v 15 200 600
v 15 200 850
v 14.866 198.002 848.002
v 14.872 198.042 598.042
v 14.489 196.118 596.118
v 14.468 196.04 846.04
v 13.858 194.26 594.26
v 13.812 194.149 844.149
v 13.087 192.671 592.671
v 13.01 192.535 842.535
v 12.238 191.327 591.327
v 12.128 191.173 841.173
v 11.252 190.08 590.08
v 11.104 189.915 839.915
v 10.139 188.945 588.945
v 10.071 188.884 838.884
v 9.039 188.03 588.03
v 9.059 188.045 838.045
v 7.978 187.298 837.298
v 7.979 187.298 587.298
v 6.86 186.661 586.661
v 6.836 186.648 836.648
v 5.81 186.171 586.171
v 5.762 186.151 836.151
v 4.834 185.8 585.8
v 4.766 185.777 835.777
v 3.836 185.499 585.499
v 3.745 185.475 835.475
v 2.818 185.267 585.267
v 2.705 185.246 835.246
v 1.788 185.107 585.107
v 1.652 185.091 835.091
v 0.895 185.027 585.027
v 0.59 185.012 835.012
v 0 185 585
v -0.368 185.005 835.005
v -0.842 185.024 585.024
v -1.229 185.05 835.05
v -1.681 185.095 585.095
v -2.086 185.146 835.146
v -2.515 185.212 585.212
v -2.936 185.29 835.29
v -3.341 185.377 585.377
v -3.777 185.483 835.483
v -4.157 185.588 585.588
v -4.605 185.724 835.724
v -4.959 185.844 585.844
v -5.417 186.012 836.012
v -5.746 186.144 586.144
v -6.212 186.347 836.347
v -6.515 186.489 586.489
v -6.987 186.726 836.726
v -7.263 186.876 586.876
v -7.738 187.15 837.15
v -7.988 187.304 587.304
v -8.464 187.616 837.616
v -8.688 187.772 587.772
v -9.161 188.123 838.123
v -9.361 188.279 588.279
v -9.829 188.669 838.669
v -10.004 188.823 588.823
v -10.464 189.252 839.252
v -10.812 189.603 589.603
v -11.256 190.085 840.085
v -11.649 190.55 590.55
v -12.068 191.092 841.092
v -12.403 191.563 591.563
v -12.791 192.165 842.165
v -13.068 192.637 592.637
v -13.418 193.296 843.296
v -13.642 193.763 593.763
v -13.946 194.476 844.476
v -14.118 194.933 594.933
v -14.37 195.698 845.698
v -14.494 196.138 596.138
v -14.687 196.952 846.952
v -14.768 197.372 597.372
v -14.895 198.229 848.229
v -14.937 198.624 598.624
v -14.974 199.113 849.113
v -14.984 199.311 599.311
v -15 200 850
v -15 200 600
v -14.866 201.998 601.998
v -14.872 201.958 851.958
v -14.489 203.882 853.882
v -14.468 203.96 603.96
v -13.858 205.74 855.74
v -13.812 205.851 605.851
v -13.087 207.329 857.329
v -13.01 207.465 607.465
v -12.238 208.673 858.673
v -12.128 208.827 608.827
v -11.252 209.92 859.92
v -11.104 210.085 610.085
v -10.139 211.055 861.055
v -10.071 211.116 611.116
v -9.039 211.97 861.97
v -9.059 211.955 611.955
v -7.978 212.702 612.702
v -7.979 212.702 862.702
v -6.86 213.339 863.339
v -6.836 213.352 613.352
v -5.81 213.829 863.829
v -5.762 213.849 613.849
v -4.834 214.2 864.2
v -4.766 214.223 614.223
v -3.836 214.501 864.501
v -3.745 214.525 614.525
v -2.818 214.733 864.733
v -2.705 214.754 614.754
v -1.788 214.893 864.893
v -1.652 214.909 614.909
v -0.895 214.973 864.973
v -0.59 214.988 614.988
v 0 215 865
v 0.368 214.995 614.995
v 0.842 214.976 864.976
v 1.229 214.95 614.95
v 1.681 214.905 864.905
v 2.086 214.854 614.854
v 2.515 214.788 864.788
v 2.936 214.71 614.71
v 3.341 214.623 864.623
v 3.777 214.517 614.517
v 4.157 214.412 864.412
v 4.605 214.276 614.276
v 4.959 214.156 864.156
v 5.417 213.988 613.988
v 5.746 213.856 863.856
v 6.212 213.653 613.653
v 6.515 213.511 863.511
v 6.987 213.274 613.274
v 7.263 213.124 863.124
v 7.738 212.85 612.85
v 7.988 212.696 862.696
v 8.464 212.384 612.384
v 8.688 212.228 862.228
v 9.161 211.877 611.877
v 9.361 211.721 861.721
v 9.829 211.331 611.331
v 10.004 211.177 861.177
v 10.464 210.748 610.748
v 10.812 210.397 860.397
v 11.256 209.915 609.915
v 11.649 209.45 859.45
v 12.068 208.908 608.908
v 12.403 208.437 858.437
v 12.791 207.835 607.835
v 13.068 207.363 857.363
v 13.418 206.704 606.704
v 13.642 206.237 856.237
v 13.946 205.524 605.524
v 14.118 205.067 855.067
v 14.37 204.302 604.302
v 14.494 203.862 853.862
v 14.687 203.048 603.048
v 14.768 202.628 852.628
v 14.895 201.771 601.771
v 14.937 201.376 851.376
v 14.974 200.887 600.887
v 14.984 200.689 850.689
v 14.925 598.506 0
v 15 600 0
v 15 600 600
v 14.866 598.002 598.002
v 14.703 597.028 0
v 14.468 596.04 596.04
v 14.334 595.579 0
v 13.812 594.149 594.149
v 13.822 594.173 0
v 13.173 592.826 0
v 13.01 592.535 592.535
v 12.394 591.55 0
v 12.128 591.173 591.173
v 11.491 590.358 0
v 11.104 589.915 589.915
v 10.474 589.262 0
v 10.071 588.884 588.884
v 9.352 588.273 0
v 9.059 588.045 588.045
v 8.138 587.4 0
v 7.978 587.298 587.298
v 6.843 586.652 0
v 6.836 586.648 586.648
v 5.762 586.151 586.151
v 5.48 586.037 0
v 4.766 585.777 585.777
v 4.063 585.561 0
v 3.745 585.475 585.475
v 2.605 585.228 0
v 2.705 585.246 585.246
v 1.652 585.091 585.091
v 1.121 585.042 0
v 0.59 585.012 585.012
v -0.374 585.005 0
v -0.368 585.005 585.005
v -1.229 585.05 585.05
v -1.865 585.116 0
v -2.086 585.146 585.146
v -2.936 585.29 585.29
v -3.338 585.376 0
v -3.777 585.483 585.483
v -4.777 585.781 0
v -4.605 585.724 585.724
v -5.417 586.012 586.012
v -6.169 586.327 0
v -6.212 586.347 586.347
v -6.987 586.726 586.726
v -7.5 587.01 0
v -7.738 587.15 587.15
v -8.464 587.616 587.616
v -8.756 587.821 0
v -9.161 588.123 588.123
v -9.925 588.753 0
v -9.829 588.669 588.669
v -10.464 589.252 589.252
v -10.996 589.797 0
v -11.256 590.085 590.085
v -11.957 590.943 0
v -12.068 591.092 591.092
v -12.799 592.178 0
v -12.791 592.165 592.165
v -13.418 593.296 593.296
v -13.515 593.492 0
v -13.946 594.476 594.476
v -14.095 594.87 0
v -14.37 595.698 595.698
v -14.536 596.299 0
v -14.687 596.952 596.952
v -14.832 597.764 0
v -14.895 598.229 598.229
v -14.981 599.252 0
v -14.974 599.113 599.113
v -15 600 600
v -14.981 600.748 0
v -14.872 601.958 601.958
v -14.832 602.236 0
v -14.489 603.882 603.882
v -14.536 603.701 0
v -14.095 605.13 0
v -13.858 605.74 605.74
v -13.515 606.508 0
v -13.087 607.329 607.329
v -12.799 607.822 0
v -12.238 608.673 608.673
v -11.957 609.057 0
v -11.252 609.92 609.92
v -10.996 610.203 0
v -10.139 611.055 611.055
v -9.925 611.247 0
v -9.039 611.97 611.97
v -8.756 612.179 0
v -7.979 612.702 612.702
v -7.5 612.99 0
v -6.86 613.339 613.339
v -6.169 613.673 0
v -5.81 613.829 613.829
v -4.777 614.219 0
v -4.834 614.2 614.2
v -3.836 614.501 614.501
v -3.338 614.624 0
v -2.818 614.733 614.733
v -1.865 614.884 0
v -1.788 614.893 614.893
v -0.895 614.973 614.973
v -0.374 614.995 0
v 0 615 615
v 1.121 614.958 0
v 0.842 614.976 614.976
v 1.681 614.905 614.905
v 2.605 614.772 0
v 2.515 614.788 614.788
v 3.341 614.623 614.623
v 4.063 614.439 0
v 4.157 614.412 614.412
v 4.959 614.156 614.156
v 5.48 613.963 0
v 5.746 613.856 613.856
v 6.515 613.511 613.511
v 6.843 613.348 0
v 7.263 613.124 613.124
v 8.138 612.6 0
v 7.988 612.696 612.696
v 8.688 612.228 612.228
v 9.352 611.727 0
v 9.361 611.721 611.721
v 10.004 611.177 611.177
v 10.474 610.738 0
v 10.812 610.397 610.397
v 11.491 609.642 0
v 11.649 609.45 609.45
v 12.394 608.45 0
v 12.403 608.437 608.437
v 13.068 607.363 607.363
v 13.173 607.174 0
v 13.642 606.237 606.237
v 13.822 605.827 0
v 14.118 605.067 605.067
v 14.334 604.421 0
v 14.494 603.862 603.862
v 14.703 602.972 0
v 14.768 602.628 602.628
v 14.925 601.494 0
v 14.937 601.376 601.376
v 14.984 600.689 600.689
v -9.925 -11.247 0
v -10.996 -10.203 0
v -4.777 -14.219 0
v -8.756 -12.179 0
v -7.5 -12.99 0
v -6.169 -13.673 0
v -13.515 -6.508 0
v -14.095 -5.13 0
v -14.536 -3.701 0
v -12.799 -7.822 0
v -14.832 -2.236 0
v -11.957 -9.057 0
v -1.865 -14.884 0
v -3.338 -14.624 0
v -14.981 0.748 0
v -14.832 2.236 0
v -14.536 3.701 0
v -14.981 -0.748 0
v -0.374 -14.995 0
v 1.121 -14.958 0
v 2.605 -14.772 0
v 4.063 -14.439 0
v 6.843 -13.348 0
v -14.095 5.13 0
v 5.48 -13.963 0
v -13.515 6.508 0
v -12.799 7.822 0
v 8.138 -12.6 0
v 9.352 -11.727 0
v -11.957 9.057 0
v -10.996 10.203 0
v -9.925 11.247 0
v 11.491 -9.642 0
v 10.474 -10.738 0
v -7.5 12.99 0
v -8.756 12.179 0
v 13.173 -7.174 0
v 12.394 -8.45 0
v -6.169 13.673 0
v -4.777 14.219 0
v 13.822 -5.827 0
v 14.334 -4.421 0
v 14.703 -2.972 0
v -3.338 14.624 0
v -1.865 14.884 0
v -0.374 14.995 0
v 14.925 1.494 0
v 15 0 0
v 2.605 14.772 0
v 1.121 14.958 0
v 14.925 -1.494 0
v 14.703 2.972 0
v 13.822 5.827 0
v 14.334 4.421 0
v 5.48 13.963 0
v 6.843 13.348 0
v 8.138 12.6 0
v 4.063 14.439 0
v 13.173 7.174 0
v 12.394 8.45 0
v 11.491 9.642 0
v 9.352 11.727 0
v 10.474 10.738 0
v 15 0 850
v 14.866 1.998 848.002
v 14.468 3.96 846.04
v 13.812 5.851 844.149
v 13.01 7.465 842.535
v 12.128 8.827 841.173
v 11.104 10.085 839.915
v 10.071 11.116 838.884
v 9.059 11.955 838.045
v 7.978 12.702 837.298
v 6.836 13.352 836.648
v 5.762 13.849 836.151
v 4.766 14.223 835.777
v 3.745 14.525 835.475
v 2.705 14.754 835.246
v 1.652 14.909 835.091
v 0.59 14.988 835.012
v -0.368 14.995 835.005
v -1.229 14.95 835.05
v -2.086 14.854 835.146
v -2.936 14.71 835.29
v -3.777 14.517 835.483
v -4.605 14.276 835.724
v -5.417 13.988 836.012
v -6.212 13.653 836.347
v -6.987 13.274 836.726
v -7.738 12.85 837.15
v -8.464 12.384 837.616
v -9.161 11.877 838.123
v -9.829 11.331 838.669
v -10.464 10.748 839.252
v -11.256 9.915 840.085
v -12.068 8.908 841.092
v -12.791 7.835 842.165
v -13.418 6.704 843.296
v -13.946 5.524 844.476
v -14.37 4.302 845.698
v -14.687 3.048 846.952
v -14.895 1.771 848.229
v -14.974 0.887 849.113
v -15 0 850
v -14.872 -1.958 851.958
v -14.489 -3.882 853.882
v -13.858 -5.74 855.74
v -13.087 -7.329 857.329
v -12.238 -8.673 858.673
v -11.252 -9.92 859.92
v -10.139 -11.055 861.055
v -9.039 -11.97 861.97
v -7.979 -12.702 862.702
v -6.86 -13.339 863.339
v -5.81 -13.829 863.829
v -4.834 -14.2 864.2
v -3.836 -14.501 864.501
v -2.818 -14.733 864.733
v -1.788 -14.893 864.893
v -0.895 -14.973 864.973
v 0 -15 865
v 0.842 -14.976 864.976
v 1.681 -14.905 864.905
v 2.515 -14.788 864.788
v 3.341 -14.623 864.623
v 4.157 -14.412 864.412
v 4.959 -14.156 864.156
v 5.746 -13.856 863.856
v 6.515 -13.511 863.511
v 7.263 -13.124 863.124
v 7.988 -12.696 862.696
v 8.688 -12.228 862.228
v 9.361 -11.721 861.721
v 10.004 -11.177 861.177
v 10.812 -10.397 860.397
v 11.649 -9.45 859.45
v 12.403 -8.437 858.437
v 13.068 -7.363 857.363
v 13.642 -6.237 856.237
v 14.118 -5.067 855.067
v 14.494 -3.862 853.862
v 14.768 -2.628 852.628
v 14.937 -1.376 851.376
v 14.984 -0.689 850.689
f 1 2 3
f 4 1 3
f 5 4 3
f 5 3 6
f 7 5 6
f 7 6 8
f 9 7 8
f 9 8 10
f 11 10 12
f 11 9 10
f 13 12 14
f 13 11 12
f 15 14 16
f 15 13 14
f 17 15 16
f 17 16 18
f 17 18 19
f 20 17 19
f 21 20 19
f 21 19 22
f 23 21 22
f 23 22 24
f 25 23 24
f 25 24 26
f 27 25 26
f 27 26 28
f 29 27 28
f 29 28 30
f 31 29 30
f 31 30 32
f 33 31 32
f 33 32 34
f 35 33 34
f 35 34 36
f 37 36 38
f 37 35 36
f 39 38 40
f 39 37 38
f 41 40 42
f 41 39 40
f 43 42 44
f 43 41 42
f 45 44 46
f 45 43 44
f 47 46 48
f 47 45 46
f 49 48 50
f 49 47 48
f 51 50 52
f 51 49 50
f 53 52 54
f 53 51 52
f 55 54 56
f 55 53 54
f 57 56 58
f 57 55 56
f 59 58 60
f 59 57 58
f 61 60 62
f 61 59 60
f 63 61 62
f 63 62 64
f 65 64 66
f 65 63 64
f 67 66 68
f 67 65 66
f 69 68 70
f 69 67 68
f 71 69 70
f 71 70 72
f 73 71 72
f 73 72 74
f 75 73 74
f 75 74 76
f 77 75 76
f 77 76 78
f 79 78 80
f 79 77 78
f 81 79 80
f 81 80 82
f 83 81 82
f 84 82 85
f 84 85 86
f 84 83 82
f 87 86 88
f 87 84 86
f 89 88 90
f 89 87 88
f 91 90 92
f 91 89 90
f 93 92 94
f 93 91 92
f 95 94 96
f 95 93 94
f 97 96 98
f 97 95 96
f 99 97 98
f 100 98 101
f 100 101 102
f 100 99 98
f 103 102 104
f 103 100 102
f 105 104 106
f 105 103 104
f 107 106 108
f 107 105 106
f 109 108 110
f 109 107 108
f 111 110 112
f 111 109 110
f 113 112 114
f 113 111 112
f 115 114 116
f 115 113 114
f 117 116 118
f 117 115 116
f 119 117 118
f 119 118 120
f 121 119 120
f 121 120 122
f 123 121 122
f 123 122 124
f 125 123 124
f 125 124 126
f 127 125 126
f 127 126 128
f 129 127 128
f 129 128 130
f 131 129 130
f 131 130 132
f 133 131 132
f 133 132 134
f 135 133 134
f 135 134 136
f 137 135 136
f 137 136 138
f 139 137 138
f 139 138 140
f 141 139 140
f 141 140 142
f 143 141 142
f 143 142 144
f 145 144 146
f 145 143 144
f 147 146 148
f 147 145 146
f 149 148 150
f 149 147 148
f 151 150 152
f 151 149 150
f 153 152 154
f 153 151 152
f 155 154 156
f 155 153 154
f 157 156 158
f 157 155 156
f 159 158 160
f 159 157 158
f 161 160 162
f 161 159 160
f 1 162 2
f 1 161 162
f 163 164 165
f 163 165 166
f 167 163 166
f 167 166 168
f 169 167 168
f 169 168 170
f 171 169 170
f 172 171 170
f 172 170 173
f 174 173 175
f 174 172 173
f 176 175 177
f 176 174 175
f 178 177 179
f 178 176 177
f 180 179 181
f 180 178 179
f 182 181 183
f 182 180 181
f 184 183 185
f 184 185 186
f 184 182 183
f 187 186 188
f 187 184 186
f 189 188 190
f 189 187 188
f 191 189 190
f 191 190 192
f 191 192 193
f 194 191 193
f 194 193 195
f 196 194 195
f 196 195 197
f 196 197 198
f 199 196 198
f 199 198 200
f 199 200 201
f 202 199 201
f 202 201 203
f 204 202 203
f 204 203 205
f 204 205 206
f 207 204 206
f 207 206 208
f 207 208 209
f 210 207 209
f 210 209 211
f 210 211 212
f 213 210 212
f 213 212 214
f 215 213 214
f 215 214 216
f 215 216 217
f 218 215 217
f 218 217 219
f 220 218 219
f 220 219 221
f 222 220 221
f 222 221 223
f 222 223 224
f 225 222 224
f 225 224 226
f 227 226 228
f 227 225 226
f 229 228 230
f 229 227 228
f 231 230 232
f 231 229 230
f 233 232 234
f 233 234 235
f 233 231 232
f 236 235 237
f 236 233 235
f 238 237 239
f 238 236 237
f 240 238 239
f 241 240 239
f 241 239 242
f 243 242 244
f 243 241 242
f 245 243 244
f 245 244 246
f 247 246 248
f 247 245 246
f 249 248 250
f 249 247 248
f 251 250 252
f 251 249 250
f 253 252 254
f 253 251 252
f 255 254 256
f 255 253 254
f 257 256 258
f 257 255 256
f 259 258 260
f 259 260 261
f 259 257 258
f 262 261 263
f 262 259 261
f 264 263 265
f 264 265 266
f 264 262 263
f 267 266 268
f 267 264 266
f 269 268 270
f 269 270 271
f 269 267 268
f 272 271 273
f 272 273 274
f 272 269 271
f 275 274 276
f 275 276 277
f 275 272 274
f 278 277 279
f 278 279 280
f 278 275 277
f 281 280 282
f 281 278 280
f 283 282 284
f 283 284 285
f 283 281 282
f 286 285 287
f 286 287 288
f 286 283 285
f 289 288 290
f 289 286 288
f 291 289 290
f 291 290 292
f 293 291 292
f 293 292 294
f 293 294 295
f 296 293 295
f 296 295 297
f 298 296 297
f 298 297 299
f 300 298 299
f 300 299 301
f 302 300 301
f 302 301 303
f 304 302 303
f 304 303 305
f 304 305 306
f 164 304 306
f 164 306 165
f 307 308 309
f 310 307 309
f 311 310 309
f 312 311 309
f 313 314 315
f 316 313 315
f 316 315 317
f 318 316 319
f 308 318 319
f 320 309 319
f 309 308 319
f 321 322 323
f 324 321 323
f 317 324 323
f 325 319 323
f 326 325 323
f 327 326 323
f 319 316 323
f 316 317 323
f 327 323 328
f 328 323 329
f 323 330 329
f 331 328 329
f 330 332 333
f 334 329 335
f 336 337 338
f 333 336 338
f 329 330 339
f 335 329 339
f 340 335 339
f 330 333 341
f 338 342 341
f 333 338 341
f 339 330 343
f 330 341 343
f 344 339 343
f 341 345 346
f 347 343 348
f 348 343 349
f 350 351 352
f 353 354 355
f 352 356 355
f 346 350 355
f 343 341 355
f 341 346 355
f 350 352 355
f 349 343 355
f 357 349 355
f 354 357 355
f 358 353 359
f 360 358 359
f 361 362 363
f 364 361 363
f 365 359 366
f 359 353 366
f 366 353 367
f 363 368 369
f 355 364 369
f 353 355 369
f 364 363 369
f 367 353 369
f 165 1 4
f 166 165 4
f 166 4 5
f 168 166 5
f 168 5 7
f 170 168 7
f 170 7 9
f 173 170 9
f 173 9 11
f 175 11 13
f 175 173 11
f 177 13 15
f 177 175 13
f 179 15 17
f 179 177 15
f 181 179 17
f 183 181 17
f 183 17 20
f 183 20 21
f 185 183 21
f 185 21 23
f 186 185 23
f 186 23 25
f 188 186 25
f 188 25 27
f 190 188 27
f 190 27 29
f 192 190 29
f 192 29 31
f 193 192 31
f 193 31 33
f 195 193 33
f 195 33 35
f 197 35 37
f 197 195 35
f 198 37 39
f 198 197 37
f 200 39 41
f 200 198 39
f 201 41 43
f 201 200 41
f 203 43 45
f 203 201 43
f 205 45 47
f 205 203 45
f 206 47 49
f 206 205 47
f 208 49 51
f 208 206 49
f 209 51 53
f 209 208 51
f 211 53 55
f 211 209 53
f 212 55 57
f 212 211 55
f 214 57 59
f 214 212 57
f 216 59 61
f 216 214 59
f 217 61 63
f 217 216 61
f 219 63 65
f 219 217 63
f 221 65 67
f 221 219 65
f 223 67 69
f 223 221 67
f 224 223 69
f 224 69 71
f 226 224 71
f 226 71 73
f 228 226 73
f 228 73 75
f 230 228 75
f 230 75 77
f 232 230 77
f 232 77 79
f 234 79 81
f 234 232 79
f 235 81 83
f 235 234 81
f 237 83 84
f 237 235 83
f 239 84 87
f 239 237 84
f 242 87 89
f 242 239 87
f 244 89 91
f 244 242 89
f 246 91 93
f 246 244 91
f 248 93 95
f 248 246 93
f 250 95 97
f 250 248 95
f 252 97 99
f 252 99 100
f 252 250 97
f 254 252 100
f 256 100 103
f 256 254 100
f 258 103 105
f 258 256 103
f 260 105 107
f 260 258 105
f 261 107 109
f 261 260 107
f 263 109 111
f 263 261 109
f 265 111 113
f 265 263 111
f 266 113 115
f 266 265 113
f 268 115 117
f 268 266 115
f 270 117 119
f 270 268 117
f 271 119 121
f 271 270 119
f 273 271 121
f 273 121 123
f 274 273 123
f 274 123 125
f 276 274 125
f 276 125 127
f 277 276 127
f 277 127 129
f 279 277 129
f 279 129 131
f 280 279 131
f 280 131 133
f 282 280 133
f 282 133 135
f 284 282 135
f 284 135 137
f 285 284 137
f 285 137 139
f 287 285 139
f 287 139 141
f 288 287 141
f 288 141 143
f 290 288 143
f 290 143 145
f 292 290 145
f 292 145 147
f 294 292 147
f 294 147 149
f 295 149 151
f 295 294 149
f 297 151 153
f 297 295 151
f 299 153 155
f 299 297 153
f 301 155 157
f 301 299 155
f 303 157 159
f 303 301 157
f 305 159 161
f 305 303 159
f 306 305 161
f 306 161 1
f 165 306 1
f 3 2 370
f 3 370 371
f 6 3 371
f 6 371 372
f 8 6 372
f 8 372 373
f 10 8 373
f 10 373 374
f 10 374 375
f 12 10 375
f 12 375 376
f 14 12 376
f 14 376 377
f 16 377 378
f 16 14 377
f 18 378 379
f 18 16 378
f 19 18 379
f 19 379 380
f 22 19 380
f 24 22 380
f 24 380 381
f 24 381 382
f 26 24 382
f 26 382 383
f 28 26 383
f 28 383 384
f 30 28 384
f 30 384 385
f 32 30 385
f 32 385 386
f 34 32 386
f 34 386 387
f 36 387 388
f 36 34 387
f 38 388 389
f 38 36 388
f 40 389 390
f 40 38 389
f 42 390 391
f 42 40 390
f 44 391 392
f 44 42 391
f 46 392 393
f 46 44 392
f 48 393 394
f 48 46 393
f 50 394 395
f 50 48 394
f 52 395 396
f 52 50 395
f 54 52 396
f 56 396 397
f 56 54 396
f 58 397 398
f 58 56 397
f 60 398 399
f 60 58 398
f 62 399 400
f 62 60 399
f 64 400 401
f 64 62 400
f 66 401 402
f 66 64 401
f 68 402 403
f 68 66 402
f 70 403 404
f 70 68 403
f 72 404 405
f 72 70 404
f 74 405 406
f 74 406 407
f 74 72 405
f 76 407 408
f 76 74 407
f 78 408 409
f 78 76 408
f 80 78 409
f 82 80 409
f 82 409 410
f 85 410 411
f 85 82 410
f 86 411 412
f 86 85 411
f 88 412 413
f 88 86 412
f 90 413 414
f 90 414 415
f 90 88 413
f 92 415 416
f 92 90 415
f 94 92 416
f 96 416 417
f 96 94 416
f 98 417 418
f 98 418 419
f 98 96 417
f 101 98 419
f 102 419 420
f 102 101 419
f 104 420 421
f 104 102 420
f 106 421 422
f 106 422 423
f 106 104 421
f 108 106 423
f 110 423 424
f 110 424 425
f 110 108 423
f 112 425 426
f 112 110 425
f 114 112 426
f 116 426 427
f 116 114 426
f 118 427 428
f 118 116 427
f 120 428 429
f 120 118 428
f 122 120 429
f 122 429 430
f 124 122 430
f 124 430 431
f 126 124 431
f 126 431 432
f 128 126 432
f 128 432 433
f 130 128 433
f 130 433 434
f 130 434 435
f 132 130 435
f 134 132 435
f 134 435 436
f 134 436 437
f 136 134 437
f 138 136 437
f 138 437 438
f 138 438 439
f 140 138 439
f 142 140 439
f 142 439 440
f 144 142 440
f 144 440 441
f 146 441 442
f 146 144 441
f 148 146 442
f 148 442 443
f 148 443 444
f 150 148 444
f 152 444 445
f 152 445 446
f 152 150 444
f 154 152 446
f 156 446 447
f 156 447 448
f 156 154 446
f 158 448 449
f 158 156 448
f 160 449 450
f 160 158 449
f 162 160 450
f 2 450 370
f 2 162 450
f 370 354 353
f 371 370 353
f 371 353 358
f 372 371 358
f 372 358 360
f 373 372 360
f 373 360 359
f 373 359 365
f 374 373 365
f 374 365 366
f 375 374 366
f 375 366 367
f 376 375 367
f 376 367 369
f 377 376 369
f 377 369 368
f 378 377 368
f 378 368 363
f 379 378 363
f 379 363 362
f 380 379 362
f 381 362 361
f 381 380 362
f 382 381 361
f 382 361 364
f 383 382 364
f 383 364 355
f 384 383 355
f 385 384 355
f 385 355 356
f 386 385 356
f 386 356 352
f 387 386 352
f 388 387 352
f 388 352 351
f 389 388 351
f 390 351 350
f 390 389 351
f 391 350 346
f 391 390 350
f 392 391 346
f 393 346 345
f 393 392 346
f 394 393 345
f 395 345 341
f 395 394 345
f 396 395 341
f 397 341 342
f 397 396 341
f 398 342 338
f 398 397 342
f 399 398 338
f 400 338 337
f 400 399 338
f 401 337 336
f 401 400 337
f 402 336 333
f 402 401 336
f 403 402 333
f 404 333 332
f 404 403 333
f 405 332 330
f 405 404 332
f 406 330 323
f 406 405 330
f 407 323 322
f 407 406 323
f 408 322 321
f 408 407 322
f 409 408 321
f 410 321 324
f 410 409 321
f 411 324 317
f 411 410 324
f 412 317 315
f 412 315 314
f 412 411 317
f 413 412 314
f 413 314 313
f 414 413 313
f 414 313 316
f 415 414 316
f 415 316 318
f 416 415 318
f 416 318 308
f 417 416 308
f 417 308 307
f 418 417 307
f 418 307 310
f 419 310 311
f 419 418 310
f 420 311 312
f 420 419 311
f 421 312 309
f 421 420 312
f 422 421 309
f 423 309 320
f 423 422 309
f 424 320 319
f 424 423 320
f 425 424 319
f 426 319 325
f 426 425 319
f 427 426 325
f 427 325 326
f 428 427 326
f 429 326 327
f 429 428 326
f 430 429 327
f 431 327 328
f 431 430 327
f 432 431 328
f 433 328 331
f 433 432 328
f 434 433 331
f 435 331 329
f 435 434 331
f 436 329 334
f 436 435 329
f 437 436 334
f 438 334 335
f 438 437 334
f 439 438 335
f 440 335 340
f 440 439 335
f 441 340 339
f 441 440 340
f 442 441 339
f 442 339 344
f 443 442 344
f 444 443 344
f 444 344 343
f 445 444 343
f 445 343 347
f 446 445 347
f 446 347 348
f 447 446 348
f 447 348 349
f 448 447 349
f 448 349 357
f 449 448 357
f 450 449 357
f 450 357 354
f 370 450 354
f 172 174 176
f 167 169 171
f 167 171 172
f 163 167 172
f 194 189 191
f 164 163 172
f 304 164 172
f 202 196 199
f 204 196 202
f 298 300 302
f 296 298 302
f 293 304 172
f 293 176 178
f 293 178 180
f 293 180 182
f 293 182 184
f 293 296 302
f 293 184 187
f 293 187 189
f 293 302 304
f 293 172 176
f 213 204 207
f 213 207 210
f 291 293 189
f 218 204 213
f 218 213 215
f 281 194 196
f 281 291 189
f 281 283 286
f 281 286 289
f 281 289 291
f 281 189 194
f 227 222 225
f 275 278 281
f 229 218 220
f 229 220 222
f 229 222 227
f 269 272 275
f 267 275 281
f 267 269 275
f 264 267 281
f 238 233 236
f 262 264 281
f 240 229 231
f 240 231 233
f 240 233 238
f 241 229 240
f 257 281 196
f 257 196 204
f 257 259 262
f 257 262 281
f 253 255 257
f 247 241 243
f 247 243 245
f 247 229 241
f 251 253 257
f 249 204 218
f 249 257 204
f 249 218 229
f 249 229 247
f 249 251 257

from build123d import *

# Parameters (mm, degrees)
F1_R = 15


with BuildPart() as f2:
    # F2: sweep along a path in F0
    with BuildLine(Plane.YZ) as f2_path:
        Line((0, 0), (0, 850))
        Line((0, 850), (200, 850))
        Line((200, 850), (200, 600))
        Line((200, 600), (600, 600))
        Line((600, 600), (600, 0))
    # F1 (on Top) → F2 (sweep)
    with BuildSketch(Plane.XY):
        Circle(F1_R)
    sweep(path=f2_path.line, transition=Transition.RIGHT)


solid = f2.part
